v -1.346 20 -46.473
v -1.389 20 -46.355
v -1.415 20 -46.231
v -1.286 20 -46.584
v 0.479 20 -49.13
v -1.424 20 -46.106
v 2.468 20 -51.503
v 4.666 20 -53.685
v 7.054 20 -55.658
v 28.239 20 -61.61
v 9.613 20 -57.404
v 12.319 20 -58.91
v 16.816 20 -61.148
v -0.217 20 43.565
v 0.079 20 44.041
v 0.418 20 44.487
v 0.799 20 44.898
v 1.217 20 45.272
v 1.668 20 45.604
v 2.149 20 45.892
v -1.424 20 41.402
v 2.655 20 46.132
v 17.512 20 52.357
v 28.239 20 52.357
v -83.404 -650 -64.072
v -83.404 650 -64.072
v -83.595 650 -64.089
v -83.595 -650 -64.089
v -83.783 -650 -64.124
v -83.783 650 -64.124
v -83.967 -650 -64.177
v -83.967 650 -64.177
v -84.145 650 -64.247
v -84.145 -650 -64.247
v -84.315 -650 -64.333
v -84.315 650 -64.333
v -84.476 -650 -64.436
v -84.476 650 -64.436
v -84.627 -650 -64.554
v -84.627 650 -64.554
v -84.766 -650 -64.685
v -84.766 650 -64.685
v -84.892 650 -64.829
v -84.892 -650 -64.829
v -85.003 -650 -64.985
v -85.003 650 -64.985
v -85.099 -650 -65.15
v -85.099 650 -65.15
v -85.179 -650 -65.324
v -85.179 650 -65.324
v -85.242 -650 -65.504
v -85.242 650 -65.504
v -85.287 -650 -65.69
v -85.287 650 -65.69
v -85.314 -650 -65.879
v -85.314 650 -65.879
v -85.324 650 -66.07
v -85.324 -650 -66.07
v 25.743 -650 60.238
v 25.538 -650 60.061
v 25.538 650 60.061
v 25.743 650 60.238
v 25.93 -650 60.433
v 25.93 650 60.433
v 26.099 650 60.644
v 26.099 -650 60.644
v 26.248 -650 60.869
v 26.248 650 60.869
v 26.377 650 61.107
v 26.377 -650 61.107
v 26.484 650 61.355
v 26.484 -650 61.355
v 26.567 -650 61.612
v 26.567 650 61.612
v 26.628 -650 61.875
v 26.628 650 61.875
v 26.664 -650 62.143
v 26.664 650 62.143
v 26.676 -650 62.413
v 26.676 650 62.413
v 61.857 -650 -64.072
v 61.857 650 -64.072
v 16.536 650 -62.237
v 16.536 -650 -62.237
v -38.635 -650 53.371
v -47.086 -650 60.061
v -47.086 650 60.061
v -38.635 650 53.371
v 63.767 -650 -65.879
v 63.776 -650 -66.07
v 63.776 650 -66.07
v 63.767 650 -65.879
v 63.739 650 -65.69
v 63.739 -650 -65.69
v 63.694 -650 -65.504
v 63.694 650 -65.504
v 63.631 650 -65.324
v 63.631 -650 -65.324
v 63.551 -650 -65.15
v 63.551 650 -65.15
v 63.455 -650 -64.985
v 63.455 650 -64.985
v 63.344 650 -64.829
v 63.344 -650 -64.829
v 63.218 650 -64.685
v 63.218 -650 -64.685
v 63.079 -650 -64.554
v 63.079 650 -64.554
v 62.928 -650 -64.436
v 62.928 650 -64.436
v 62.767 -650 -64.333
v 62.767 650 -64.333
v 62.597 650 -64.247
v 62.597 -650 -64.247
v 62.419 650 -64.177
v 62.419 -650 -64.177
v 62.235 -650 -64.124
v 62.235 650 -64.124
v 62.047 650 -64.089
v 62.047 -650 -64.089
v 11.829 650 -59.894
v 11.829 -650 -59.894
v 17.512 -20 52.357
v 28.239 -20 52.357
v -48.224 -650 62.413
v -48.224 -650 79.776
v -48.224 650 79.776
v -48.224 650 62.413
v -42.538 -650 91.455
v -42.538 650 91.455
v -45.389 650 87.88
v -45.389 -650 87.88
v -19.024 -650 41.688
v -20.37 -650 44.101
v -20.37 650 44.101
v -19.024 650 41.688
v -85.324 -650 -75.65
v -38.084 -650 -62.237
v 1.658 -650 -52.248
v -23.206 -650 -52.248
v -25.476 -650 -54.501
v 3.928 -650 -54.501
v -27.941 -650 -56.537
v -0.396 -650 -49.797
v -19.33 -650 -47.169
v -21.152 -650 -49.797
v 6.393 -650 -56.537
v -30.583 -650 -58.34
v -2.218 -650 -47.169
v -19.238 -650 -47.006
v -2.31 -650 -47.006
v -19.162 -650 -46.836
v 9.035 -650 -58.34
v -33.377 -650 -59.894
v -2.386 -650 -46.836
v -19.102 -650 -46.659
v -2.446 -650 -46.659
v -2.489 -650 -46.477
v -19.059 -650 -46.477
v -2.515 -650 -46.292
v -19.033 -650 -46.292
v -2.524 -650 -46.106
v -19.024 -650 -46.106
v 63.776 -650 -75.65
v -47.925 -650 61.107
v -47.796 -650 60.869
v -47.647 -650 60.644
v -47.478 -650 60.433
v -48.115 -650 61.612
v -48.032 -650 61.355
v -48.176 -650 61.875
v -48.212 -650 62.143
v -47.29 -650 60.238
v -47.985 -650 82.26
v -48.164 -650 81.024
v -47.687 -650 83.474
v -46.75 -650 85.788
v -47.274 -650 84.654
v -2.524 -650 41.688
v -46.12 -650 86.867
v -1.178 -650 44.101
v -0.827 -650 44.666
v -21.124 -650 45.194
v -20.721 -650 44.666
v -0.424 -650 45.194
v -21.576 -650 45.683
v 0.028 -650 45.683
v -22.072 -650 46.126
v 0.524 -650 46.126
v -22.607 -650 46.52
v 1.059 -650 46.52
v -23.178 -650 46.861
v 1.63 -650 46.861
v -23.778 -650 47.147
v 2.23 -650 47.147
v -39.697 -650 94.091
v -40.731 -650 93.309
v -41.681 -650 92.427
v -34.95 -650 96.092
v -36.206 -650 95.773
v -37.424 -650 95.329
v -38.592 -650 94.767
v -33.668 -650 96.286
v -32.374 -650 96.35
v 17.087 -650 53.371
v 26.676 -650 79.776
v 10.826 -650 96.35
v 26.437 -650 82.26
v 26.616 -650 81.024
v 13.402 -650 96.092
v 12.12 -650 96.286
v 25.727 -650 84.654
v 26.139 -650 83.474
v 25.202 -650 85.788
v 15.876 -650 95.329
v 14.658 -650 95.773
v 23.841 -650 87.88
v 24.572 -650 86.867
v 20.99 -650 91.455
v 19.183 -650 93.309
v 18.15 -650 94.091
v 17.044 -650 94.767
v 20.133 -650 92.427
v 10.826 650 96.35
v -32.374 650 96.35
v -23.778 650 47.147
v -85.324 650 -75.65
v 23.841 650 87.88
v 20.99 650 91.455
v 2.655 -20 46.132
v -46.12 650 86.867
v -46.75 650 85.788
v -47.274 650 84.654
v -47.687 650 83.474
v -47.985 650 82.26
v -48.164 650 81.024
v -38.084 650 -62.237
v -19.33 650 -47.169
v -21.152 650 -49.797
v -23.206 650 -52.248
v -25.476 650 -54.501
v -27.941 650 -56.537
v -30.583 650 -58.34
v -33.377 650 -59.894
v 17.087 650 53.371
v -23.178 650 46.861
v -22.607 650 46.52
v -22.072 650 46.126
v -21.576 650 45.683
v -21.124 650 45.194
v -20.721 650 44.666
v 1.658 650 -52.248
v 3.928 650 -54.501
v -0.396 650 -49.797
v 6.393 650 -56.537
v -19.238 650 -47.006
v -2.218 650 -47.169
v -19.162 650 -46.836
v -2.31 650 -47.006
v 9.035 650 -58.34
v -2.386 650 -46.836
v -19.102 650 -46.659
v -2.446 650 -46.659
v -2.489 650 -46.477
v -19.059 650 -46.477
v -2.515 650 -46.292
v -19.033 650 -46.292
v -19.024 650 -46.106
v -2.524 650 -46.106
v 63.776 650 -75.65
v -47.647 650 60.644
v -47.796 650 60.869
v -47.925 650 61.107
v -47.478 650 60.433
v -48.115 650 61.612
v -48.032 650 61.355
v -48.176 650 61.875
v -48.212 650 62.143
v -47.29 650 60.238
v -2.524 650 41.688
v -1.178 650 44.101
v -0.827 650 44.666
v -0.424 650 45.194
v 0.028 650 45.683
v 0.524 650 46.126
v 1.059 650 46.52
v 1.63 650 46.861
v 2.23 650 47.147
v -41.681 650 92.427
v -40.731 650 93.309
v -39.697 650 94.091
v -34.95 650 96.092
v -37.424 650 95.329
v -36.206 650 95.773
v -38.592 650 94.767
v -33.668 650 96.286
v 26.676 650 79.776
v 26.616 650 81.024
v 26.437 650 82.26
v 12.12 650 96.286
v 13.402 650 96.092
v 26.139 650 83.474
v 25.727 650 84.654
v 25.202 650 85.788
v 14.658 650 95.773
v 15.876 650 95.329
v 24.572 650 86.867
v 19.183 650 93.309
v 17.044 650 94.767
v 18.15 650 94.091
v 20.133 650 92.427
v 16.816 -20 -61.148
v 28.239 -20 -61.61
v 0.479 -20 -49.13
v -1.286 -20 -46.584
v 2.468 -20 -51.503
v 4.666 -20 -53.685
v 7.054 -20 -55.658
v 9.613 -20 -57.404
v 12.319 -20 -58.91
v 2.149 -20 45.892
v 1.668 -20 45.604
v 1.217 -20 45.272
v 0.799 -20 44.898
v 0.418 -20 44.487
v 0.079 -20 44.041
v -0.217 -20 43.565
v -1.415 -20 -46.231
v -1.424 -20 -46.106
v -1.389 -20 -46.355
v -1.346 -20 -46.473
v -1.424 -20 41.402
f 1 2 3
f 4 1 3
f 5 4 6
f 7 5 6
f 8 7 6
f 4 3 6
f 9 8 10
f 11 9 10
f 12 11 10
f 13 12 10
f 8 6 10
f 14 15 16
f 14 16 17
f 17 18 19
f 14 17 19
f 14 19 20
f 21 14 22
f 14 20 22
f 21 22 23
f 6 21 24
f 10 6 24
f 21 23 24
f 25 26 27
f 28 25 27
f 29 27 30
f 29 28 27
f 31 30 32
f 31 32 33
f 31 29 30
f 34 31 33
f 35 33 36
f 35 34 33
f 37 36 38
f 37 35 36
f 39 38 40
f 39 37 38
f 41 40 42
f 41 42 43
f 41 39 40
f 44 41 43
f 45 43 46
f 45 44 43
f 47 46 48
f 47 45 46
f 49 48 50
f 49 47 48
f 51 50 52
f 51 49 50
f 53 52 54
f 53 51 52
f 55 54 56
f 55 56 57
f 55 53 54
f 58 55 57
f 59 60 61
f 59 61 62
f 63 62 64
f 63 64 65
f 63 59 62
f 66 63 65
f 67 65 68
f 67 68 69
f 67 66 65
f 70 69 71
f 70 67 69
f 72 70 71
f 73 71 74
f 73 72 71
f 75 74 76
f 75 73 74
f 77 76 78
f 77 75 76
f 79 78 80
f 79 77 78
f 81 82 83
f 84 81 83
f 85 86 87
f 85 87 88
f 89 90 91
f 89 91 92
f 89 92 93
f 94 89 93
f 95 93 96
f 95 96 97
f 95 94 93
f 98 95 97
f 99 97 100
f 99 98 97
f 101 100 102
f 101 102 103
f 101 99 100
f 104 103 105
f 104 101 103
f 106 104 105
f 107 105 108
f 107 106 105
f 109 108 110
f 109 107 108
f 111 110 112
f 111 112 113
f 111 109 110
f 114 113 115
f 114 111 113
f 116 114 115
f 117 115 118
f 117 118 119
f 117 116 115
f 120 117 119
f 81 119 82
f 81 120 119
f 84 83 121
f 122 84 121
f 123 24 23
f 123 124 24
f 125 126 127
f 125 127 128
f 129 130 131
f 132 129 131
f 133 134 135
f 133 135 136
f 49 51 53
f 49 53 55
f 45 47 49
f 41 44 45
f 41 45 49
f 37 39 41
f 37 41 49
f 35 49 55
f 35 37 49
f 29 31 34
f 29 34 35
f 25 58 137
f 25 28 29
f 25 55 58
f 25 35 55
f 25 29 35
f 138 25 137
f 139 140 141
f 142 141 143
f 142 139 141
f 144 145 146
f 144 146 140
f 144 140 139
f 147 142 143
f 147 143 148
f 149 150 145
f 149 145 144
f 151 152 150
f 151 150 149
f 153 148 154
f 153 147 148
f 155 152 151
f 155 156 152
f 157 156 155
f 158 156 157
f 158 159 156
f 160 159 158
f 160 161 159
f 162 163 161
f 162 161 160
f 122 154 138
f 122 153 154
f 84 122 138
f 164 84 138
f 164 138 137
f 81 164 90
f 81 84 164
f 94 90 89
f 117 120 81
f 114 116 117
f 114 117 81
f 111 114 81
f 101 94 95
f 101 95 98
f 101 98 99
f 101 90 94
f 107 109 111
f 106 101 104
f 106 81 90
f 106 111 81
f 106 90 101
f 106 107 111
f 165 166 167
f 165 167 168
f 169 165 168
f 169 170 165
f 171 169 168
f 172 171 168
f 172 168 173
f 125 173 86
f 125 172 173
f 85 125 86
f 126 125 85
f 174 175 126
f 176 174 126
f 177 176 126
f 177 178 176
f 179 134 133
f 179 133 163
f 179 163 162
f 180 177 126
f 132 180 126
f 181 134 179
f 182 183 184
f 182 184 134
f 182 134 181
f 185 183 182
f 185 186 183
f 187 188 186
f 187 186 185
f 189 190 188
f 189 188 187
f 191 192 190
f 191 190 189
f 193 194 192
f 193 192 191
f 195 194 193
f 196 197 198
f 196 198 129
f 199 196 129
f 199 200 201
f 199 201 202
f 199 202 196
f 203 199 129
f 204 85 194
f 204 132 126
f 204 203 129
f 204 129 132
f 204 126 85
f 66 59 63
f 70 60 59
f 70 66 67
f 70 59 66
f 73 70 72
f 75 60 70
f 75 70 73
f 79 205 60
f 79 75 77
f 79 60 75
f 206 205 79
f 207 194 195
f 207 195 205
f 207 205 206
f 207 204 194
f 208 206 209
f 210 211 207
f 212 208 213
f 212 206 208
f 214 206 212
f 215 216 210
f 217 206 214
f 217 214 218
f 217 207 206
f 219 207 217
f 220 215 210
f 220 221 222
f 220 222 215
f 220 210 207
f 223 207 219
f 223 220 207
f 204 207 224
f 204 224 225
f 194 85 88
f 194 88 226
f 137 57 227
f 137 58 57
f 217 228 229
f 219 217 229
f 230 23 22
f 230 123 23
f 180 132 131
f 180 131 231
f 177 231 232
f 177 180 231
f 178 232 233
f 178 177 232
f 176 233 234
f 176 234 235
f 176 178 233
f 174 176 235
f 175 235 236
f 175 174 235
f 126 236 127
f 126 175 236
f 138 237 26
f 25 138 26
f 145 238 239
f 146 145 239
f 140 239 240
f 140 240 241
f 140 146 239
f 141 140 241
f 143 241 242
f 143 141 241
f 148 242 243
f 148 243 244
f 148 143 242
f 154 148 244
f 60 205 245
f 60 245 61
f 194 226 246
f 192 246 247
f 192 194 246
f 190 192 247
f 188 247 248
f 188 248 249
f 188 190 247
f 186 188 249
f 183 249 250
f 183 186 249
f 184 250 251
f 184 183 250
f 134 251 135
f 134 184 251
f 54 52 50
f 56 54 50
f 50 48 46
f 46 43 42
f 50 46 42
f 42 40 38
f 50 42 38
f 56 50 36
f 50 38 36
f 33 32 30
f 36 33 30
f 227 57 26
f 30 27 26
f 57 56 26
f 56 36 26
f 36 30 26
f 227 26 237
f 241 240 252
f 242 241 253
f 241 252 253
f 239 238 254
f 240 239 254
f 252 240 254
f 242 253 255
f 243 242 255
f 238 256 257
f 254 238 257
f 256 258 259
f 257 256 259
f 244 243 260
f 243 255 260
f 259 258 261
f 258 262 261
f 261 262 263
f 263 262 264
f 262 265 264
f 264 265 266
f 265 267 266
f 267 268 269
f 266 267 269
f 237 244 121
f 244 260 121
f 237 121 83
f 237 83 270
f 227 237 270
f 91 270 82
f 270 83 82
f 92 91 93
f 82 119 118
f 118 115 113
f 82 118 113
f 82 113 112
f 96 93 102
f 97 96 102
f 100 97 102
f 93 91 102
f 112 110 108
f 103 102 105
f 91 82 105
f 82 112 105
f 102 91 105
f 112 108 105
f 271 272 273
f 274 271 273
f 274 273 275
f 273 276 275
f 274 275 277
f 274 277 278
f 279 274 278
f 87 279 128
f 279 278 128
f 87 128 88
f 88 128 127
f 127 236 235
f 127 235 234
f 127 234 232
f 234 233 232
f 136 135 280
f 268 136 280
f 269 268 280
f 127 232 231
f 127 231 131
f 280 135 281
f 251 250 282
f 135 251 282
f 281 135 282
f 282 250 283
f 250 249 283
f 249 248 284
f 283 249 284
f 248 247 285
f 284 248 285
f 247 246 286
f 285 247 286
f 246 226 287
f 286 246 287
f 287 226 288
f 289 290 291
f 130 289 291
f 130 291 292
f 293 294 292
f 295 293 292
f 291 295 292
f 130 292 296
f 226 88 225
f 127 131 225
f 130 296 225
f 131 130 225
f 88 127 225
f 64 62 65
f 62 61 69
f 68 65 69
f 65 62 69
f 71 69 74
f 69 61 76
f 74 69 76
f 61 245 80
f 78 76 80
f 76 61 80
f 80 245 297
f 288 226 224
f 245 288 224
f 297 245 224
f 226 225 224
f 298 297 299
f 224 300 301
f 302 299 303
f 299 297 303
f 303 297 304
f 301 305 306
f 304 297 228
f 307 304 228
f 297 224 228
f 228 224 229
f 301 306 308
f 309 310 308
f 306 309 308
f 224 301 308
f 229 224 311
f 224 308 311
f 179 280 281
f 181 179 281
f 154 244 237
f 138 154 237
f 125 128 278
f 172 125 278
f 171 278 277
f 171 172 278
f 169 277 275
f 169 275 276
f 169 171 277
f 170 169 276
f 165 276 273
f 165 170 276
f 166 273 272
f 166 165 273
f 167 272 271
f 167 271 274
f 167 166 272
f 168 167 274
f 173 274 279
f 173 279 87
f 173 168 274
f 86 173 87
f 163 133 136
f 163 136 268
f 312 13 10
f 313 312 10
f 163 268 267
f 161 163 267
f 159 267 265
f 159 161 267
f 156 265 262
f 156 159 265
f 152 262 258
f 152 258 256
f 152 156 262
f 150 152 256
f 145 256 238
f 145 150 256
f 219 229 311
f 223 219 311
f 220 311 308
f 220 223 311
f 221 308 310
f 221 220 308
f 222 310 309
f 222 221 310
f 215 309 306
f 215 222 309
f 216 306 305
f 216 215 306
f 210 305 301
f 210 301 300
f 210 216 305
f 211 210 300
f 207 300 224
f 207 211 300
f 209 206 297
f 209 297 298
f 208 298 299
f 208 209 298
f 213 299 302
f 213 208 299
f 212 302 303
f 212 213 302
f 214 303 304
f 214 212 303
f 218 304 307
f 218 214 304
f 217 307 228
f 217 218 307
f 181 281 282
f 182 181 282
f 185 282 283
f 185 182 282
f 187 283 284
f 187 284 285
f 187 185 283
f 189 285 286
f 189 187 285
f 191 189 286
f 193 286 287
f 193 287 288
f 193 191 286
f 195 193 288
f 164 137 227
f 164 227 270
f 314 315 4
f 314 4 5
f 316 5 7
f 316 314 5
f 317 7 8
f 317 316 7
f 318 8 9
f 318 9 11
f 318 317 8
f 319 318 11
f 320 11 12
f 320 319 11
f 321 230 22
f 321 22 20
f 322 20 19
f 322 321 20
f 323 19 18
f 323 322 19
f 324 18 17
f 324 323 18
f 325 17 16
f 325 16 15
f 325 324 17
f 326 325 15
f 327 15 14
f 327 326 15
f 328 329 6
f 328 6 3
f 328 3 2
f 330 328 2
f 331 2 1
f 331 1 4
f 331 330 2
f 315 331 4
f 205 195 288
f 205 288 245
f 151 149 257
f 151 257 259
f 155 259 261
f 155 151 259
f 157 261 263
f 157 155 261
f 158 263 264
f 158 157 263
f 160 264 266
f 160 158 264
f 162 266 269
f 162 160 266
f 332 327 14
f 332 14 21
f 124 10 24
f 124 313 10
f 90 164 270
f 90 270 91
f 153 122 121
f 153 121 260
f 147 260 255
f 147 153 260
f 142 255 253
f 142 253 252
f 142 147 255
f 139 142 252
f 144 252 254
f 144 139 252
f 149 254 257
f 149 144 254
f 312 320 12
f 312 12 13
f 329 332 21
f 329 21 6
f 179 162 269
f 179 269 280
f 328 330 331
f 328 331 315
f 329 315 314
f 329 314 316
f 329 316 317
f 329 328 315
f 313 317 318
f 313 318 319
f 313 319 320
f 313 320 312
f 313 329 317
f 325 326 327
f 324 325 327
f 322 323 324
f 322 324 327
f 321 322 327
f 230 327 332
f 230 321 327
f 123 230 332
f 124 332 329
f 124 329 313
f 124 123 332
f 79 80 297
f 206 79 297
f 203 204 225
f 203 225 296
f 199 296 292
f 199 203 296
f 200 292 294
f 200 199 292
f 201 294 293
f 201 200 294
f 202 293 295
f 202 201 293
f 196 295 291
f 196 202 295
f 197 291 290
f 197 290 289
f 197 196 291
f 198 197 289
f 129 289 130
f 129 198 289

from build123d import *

# Parameters (mm, degrees)
F1_DEPTH = 650
F2_DEPTH = 650
F3_DEPTH = 20


with BuildPart() as f1:
    # F0 (on Front) → F1 (new body, symmetric)
    with BuildSketch(Plane.XZ):
        with BuildLine():
            Line((-85.3235702982, -66.0703902778), (-85.3235702982, -75.6497139107))
            Line((-85.3235702982, -75.6497139107), (63.7756578624, -75.6497139107))
            Line((63.7756578624, -75.6497139107), (63.7756578624, -66.0703902778))
            ThreePointArc((63.7756578624, -66.0703902778), (63.2181887651, -64.685072771), (61.8565532677, -64.0720269641))
            Line((61.8565532677, -64.0720269641), (16.536237672, -62.2374229799))
            Line((16.536237672, -62.2374229799), (11.8292871562, -59.8943959289))
            ThreePointArc((11.8292871562, -59.8943959289), (3.927875719, -54.5007088526), (-2.2178988902, -47.1690230008))
            ThreePointArc((-2.2178988902, -47.1690230008), (-2.4459194517, -46.6589703681), (-2.5239562179, -46.1057458859))
            Line((-2.5239562179, -46.1057458859), (-2.5239562179, 3.5298217554))
            Line((-2.5239562179, 3.5298217554), (-2.5239562179, 41.6880398989))
            Line((-2.5239562179, 41.6880398989), (-1.1780247749, 44.1008258038))
            ThreePointArc((-1.1780247749, 44.1008258038), (0.270485849, 45.9099683385), (2.2303186176, 47.1469951197))
            Line((2.2303186176, 47.1469951197), (17.0868914574, 53.3710867167))
            Line((17.0868914574, 53.3710867167), (25.5383929173, 60.061007626))
            ThreePointArc((25.5383929173, 60.061007626), (26.3769749844, 61.1067171561), (26.6764297018, 62.4132603727))
            Line((26.6764297018, 62.4132603727), (26.6764297018, 79.7755250827))
            ThreePointArc((26.6764297018, 79.7755250827), (25.9470320629, 84.0688125989), (23.8406885177, 87.8803287646))
            Line((23.8406885177, 87.8803287646), (20.9902360949, 91.4550897713))
            ThreePointArc((20.9902360949, 91.4550897713), (16.4667907014, 95.0627249443), (10.8259772789, 96.3502860893))
            Line((10.8259772789, 96.3502860893), (-10.7739562179, 96.3502860893))
            Line((-10.7739562179, 96.3502860893), (-32.3738897147, 96.3502860893))
            ThreePointArc((-32.3738897147, 96.3502860893), (-38.0147031372, 95.0627249443), (-42.5381485306, 91.4550897713))
            Line((-42.5381485306, 91.4550897713), (-45.3886009535, 87.8803287646))
            ThreePointArc((-45.3886009535, 87.8803287646), (-47.4949444986, 84.0688125989), (-48.2243421376, 79.7755250827))
            Line((-48.2243421376, 79.7755250827), (-48.2243421376, 62.4132603727))
            ThreePointArc((-48.2243421376, 62.4132603727), (-47.9248874202, 61.1067171561), (-47.0863053531, 60.061007626))
            Line((-47.0863053531, 60.061007626), (-38.6348038932, 53.3710867167))
            Line((-38.6348038932, 53.3710867167), (-23.7782310533, 47.1469951197))
            ThreePointArc((-23.7782310533, 47.1469951197), (-21.8183982848, 45.9099683385), (-20.3698876609, 44.1008258038))
            Line((-20.3698876609, 44.1008258038), (-19.0239562179, 41.6880398989))
            Line((-19.0239562179, 41.6880398989), (-19.0239562179, -46.1057458859))
            ThreePointArc((-19.0239562179, -46.1057458859), (-19.101992984, -46.6589703681), (-19.3300135456, -47.1690230008))
            ThreePointArc((-19.3300135456, -47.1690230008), (-25.4757881548, -54.5007088526), (-33.3771995919, -59.8943959289))
            Line((-33.3771995919, -59.8943959289), (-38.0841501077, -62.2374229799))
            Line((-38.0841501077, -62.2374229799), (-83.4044657034, -64.0720269641))
            ThreePointArc((-83.4044657034, -64.0720269641), (-84.7661012009, -64.685072771), (-85.3235702982, -66.0703902778))
        make_face()
    extrude(amount=F1_DEPTH, both=True)


with BuildPart() as f1b:
    # F0 (on Front) → F1, piece 2 (new body, symmetric)
    with BuildSketch(Plane.XZ):
        with BuildLine():
            Line((17.5119378942, 52.3565221913), (2.6553650544, 46.1324305944))
            ThreePointArc((2.6553650544, 46.1324305944), (1.0035063838, 45.089793974), (-0.2173808633, 43.5649456144))
            Line((-0.2173808633, 43.5649456144), (-1.423954925, 41.4019789161))
            Line((-1.423954925, 41.4019789161), (-1.423954925, -46.1057472322))
            ThreePointArc((-1.423954925, -46.1057472322), (-1.3888384328, -46.3546978765), (-1.2862293337, -46.5842212176))
            ThreePointArc((-1.2862293337, -46.5842212176), (4.6663921226, -53.6854823746), (12.3194731818, -58.9096533637))
            Line((12.3194731818, -58.9096533637), (16.8158063074, -61.1478392355))
            Line((16.8158063074, -61.1478392355), (28.2388199121, -61.6102523056))
            Line((28.2388199121, -61.6102523056), (28.2388199121, 52.3565221913))
            Line((28.2388199121, 52.3565221913), (17.5119378942, 52.3565221913))
        make_face()
    extrude(amount=F1_DEPTH, both=True)

    # F0 (on Front) → F2 (cut, symmetric)
    with BuildSketch(Plane.XZ):
        with BuildLine():
            Line((17.5119378942, 52.3565221913), (2.6553650544, 46.1324305944))
            ThreePointArc((2.6553650544, 46.1324305944), (1.0035063838, 45.089793974), (-0.2173808633, 43.5649456144))
            Line((-0.2173808633, 43.5649456144), (-1.423954925, 41.4019789161))
            Line((-1.423954925, 41.4019789161), (-1.423954925, -46.1057472322))
            ThreePointArc((-1.423954925, -46.1057472322), (-1.3888384328, -46.3546978765), (-1.2862293337, -46.5842212176))
            ThreePointArc((-1.2862293337, -46.5842212176), (4.6663921226, -53.6854823746), (12.3194731818, -58.9096533637))
            Line((12.3194731818, -58.9096533637), (16.8158063074, -61.1478392355))
            Line((16.8158063074, -61.1478392355), (28.2388199121, -61.6102523056))
            Line((28.2388199121, -61.6102523056), (28.2388199121, 52.3565221913))
            Line((28.2388199121, 52.3565221913), (17.5119378942, 52.3565221913))
        make_face()
    extrude(amount=F2_DEPTH, both=True, mode=Mode.SUBTRACT)


with BuildPart() as f3:
    # F0 (on Front) → F3 (new body, symmetric)
    with BuildSketch(Plane.XZ):
        with BuildLine():
            Line((17.5119378942, 52.3565221913), (2.6553650544, 46.1324305944))
            ThreePointArc((2.6553650544, 46.1324305944), (1.0035063838, 45.089793974), (-0.2173808633, 43.5649456144))
            Line((-0.2173808633, 43.5649456144), (-1.423954925, 41.4019789161))
            Line((-1.423954925, 41.4019789161), (-1.423954925, -46.1057472322))
            ThreePointArc((-1.423954925, -46.1057472322), (-1.3888384328, -46.3546978765), (-1.2862293337, -46.5842212176))
            ThreePointArc((-1.2862293337, -46.5842212176), (4.6663921226, -53.6854823746), (12.3194731818, -58.9096533637))
            Line((12.3194731818, -58.9096533637), (16.8158063074, -61.1478392355))
            Line((16.8158063074, -61.1478392355), (28.2388199121, -61.6102523056))
            Line((28.2388199121, -61.6102523056), (28.2388199121, 52.3565221913))
            Line((28.2388199121, 52.3565221913), (17.5119378942, 52.3565221913))
        make_face()
    extrude(amount=F3_DEPTH, both=True)


solid = Compound([f1.part, f3.part])
